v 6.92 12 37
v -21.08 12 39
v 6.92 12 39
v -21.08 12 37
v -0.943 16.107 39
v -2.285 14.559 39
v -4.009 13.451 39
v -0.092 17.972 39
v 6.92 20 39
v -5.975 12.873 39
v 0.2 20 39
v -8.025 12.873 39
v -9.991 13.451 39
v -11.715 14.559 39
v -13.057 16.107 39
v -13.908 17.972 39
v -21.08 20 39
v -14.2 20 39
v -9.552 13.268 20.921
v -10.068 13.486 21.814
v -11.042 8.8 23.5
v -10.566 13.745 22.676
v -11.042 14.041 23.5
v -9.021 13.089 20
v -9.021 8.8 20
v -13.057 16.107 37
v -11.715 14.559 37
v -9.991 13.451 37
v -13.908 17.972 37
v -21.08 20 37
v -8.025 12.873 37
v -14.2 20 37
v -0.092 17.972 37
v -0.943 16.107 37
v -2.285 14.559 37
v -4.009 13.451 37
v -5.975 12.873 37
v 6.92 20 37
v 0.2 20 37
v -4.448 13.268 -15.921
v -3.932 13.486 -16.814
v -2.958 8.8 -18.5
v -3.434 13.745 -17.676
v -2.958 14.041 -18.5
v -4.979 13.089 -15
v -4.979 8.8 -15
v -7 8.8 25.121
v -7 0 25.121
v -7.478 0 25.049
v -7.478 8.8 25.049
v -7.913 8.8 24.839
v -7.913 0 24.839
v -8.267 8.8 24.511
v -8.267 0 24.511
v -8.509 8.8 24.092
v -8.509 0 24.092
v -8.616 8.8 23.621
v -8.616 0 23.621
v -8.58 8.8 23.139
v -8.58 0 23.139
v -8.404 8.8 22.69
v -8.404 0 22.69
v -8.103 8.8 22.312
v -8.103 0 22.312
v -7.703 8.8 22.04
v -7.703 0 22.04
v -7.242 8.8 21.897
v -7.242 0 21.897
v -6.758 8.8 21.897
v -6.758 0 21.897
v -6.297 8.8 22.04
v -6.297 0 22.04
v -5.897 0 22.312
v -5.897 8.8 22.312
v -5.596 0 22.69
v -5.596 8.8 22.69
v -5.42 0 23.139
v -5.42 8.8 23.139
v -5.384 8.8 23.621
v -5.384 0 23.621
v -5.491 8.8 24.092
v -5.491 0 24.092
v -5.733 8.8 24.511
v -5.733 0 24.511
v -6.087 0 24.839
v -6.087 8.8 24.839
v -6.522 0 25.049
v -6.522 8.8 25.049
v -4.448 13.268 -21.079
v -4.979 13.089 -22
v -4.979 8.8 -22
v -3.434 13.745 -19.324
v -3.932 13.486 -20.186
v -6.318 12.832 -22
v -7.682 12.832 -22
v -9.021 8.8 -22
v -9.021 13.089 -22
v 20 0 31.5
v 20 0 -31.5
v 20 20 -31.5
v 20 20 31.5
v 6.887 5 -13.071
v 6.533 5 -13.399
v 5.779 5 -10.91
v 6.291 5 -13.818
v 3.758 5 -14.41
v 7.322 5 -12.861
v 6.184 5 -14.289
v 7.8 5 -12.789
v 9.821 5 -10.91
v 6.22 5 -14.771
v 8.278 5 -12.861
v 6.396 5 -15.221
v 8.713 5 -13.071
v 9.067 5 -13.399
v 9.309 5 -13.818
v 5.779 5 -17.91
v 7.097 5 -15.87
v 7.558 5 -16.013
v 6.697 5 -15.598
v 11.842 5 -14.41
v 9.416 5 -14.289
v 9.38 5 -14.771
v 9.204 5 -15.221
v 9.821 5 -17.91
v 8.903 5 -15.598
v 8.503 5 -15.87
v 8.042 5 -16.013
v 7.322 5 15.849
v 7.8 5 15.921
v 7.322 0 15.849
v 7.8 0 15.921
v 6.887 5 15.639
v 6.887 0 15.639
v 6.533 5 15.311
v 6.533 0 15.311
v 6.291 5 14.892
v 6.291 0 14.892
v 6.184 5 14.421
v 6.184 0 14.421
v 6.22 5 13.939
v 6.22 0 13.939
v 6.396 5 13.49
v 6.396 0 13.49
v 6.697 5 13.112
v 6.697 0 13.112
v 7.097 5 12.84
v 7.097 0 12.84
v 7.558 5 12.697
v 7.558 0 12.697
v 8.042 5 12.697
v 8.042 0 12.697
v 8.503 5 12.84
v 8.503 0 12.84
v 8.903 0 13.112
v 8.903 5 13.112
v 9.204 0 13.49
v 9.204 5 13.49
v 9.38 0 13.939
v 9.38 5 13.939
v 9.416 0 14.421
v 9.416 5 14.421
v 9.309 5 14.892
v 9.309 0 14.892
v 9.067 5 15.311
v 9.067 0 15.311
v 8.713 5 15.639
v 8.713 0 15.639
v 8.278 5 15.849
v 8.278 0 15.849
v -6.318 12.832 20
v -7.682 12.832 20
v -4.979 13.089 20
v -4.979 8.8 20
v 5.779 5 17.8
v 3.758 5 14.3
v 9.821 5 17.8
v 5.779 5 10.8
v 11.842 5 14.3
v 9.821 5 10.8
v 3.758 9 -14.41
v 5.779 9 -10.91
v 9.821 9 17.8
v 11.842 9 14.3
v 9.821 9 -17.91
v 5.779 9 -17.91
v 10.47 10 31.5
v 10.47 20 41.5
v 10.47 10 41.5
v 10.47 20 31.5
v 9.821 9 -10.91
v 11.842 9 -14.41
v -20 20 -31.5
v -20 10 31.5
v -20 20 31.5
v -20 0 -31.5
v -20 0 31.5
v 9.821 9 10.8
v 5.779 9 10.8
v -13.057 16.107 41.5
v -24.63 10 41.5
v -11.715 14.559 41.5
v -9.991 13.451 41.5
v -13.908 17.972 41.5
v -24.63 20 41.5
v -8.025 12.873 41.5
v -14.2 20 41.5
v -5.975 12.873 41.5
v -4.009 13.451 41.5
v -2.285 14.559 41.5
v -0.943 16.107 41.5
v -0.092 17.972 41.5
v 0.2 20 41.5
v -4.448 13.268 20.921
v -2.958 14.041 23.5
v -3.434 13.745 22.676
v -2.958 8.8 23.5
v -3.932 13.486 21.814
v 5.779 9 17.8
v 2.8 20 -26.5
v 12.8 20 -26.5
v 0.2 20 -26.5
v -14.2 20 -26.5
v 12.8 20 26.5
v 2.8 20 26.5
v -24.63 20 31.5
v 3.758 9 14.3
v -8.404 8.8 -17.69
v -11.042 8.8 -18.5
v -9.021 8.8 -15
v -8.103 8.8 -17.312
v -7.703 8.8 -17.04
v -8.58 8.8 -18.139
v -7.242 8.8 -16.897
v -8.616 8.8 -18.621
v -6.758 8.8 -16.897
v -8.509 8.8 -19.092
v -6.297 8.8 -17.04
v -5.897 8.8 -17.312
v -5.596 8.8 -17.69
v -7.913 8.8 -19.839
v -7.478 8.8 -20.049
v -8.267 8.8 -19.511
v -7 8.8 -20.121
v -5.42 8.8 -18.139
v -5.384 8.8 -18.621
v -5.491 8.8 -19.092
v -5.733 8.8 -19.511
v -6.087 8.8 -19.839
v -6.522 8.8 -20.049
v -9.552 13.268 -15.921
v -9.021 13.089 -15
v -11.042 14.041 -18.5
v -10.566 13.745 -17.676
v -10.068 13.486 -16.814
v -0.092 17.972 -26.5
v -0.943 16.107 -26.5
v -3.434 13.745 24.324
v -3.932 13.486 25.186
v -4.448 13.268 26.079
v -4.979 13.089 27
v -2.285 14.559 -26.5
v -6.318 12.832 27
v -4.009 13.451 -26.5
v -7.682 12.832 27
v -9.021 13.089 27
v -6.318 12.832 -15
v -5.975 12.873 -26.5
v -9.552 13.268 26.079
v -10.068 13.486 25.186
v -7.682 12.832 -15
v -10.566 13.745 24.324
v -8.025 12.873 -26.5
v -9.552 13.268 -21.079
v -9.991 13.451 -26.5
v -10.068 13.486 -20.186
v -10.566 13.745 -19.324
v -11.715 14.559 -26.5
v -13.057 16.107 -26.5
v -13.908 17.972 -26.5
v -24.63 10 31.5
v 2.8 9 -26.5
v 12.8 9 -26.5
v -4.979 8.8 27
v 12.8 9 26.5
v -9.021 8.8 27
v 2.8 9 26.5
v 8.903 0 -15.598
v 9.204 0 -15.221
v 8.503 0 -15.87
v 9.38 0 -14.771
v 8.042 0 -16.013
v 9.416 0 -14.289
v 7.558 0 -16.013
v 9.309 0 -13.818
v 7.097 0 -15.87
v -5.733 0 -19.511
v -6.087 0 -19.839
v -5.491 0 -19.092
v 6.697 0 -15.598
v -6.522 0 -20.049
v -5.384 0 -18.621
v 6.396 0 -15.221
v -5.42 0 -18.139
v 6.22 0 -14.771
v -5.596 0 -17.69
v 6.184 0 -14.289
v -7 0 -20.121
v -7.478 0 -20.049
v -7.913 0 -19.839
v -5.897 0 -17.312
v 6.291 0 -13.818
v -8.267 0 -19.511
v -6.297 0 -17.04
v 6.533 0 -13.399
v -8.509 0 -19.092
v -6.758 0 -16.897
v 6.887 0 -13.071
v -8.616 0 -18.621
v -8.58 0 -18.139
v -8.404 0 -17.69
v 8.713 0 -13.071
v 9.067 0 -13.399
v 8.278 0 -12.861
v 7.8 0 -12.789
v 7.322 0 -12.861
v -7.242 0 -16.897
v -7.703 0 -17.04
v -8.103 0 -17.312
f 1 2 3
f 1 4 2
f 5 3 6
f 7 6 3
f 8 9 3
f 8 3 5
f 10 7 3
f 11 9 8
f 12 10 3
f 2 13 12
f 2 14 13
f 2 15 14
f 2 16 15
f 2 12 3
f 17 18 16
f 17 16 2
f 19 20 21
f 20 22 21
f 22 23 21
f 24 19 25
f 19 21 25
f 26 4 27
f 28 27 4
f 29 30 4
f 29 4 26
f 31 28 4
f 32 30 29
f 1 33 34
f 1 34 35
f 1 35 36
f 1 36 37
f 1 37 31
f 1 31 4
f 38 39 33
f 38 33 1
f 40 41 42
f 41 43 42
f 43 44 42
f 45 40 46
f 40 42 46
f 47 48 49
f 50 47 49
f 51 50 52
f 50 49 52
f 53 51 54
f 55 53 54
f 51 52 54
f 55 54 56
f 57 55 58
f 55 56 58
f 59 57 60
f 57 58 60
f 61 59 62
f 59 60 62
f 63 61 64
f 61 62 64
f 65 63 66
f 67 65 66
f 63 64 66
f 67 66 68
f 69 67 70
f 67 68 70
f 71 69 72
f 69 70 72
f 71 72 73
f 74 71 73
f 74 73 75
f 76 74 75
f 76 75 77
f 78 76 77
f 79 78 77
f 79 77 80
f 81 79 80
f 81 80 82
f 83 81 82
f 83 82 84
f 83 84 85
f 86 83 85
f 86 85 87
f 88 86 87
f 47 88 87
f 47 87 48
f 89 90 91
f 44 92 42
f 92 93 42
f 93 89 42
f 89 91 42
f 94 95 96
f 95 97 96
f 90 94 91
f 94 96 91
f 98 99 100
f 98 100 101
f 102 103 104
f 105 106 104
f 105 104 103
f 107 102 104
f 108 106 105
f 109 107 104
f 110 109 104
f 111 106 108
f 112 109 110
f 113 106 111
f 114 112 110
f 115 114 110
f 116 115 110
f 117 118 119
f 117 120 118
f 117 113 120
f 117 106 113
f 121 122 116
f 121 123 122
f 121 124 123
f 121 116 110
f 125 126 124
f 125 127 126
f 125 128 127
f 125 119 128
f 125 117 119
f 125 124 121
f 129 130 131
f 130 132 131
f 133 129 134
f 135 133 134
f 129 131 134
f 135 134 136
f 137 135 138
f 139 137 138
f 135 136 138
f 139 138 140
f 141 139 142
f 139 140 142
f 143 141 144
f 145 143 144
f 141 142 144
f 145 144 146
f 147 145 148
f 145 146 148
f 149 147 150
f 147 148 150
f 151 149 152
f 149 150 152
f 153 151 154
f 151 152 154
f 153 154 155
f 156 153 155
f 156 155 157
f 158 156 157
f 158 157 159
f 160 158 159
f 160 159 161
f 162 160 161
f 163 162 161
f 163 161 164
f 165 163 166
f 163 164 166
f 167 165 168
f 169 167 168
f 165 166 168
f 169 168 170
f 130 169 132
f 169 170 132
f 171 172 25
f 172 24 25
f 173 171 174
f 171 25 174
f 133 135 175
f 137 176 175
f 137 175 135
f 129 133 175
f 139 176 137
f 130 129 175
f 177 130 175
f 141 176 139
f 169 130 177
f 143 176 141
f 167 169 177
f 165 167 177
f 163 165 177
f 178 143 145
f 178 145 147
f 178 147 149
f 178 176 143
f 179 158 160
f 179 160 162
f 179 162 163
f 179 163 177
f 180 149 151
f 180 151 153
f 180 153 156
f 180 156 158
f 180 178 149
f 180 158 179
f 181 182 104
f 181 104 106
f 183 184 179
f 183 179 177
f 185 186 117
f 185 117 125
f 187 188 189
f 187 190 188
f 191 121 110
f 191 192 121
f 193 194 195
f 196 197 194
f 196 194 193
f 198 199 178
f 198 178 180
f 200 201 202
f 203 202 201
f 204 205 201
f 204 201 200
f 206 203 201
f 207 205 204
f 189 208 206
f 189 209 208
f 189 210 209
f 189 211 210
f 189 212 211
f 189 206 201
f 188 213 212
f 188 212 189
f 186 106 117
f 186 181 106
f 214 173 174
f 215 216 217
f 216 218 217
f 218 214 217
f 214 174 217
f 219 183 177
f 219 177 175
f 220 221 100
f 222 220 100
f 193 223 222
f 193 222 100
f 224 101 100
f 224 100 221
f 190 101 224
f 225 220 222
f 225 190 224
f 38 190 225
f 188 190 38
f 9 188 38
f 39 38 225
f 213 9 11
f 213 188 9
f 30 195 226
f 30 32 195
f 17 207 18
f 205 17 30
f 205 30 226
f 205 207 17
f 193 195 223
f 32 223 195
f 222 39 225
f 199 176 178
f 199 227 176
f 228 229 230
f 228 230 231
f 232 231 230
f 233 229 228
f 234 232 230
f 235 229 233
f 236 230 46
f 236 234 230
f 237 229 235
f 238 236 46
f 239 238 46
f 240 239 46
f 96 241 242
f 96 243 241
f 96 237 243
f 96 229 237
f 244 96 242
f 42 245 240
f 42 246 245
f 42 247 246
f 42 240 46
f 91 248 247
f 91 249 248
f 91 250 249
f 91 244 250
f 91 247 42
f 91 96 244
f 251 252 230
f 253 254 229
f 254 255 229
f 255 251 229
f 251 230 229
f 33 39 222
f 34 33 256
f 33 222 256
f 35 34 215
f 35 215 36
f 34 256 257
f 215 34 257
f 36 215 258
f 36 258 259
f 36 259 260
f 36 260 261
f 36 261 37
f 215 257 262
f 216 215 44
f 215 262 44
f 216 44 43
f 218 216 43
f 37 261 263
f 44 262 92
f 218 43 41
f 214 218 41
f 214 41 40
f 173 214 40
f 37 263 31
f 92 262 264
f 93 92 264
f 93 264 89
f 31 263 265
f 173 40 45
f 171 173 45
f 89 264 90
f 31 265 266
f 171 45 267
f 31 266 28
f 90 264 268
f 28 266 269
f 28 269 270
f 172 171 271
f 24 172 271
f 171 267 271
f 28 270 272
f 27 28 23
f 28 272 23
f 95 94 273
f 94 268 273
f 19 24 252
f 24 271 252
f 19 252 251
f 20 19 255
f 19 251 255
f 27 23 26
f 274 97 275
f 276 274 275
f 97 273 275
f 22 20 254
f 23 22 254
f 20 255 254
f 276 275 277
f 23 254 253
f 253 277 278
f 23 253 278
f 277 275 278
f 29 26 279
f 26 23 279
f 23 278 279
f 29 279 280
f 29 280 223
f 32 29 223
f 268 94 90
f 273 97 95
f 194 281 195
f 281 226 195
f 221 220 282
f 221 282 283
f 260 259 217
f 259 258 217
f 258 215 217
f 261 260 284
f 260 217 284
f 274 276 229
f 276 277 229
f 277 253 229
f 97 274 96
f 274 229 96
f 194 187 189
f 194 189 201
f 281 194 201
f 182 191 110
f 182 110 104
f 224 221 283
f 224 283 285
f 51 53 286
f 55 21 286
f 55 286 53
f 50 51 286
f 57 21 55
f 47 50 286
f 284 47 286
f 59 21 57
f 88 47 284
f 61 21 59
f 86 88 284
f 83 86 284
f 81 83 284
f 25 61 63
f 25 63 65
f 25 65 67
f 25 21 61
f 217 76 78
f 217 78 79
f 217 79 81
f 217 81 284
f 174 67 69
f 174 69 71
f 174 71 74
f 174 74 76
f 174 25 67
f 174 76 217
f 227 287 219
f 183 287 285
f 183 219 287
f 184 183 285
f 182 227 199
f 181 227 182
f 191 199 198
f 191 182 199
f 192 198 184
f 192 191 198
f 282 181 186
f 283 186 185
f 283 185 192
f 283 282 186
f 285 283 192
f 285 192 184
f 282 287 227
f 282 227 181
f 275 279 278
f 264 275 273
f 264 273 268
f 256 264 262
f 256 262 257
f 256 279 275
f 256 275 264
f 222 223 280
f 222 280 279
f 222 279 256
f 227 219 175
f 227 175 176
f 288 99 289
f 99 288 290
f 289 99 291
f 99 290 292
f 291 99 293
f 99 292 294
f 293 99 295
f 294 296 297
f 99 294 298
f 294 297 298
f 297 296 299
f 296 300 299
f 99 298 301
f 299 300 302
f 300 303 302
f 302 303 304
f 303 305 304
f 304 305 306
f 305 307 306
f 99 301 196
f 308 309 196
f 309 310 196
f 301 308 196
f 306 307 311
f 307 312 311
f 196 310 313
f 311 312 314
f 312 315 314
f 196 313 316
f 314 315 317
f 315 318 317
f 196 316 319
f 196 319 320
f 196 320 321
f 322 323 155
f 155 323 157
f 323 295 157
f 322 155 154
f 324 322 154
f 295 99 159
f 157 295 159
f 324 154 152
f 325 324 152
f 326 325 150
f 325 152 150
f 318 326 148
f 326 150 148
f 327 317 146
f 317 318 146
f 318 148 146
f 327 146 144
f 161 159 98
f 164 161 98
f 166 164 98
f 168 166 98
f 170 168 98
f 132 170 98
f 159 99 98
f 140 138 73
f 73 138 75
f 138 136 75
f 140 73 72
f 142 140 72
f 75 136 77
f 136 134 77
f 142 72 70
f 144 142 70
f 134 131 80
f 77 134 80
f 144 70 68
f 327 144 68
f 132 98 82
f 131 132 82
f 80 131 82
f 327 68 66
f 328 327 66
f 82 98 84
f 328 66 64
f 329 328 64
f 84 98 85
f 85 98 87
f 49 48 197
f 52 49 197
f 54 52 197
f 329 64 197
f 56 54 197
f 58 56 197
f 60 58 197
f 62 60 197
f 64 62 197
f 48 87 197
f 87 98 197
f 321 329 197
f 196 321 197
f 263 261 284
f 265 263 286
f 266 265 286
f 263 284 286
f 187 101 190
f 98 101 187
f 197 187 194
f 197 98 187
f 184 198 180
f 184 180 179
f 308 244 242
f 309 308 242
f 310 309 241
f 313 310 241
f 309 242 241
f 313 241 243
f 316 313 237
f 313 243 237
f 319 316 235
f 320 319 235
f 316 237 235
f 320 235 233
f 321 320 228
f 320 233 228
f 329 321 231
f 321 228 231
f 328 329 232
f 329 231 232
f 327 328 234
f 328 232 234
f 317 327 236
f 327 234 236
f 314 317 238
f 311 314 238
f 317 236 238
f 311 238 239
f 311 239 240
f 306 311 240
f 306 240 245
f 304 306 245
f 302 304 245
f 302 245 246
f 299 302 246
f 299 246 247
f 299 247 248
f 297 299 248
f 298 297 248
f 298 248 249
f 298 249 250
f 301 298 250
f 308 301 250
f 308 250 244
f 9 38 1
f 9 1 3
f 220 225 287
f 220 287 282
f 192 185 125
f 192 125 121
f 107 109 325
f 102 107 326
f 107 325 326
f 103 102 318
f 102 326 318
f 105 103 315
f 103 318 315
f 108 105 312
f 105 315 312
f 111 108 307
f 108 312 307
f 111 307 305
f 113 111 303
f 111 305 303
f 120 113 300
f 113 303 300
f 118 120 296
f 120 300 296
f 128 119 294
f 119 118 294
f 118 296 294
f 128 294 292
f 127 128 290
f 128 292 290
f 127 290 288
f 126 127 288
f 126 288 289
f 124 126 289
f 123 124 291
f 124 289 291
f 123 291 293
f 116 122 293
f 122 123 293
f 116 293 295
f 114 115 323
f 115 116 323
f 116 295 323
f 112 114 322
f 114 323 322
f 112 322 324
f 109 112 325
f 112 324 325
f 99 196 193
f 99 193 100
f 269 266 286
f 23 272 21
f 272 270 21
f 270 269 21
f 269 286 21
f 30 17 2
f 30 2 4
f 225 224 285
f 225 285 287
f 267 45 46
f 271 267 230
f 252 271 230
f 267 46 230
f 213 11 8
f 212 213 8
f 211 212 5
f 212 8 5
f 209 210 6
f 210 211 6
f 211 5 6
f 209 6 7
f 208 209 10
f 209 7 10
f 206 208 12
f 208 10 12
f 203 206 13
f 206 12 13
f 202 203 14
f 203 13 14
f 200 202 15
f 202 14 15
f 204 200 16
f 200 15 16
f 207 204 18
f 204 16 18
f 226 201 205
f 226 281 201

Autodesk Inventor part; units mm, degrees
ref_plane "YZ Plane" through (0, 0, 0) normal (1, 0, 0) x (0, 1, 0)
ref_plane "XZ Plane" through (0, 0, 0) normal (0, 1, 0) x (-1, 0, 0)
ref_plane "XY Plane" through (0, 0, 0) normal (0, 0, 1) x (1, 0, 0)
sketch "Sketch1" plane through (0, 0, 0) normal (0, 1, 0) x (-1, 0, 0)
  line L0 (28, 0) -> (-28, 0) projected
  line L1 (0, -44.1) -> (0, 44.1) projected
  line L2 (-20, 31.5) -> (20, 31.5)
  line L3 (20, 31.5) -> (20, -31.5)
  line L4 (20, -31.5) -> (-20, -31.5)
  line L5 (-20, -31.5) -> (-20, 31.5)
  line L6 (-20, 31.5) -> (20, -31.5) construction
  line L7 (20, 31.5) -> (-20, -31.5) construction
  point P0 (0, 0)
  dimension "d0" = 40
  dimension "d1" = 63
extrude "Extrusion1" add sketch "Sketch1" along normal blind 20
sketch "Sketch2" plane through (0, 20, 0) normal (0, 1, 0) x (1, 0, 0)
  line L0 (20, 31.5) -> (-20, 31.5) projected
  line L1 (-20, 31.5) -> (-20, -31.5) projected
  line L2 (2.8, 26.5) -> (12.8, 26.5)
  line L3 (12.8, 26.5) -> (12.8, -26.5)
  line L4 (12.8, -26.5) -> (2.8, -26.5)
  line L5 (2.8, -26.5) -> (2.8, 26.5)
  line L6 (20, -31.5) -> (20, 31.5) projected
  dimension "d9" = 10
  dimension "d10" = 53
  dimension "d11" = 5
  dimension "d23" = 7.2
extrude "Extrusion2" cut sketch "Sketch2" against normal blind 11
sketch "Sketch3" plane through (0, 9, 0) normal (0, 1, 0) x (1, 0, 0)
  line L0 (20, -31.5) -> (20, 31.5) projected
  line L1 (12.8, 26.5) -> (12.8, -26.5) projected
  line L2 (20, 31.5) -> (-20, 31.5) projected
  point P0 (0, 0)
  point P1 (7.8, 14.41)
  point P2 (7.8, -14.3)
  dimension "d22" = 5
  dimension "d27" = 17.09
  dimension "d40" = 28.71
  dimension "d41" = 12.2
hole "Hole1" at (7.8, 9, -14.41) at (7.8, 9, 14.3) direction (0, -1, 0) diameter 3.242 end through all thread size "M4x0.7" class "6H" standard "ISO Metric profile"
sketch "Sketch5" plane through (0, 9, 0) normal (0, 1, 0) x (1, 0, 0)
  circle A0 centre (7.8, 14.41) radius 1.621 projected
  line L0 (9.8207, 10.91) -> (5.7793, 10.91)
  line L1 (5.7793, 10.91) -> (3.7585, 14.41)
  line L2 (3.7585, 14.41) -> (5.7793, 17.91)
  line L3 (5.7793, 17.91) -> (9.8207, 17.91)
  line L4 (9.8207, 17.91) -> (11.8415, 14.41)
  line L5 (11.8415, 14.41) -> (9.8207, 10.91)
  line L6 (2.8, 26.5) -> (12.8, 26.5) projected
  line L7 (12.8, -26.5) -> (2.8, -26.5) projected
  circle A1 centre (7.8, -14.3) radius 1.621 projected
  line L8 (9.8207, -17.8) -> (5.7793, -17.8)
  line L9 (5.7793, -17.8) -> (3.7585, -14.3)
  line L10 (3.7585, -14.3) -> (5.7793, -10.8)
  line L11 (5.7793, -10.8) -> (9.8207, -10.8)
  line L12 (9.8207, -10.8) -> (11.8415, -14.3)
  line L13 (11.8415, -14.3) -> (9.8207, -17.8)
  point P0 (0, 0)
  dimension "d37" = 7
  dimension "d42" = 7
extrude "Extrusion3" cut sketch "Sketch5" against normal blind 4 contours L0 L1 L2 L3 L4 L5 | A1 | L8 L9 L10 L11 L12 L13
sketch "Sketch9" plane through (-20, 0, 31.5) normal (0, 0, 1) x (1, 0, 0)
  line L0 (30.47, 20) -> (30.47, 10)
  line L1 (30.47, 10) -> (-4.63, 10)
  line L2 (-4.63, 10) -> (-4.63, 20)
  line L3 (0, 0) -> (0, 20) projected
  line L4 (40, 20) -> (0, 20) projected
  arc A0 (5.8, 20) -> (20.2, 20) centre (13, 20) ccw
  line L5 (-4.63, 20) -> (5.8, 20)
  line L6 (20.2, 20) -> (30.47, 20)
  line L7 (40, 0) -> (40, 20) projected
  line L8 (5.8, 20) -> (20.2, 20)
  point P0 (20, 0)
  point P1 (0, 10)
  dimension "d58" = 35.1
  dimension "d59" = 10
  dimension "d60" = 4.63
  dimension "d64" = 7.2
  dimension "d65" = 17.63
  dimension "d66" = 19.8
  dimension "d67" = 14.4
extrude "Extrusion6" add sketch "Sketch9" along normal blind 10 contours L0 L1 L3 L4 A0 | L1 L2 L5 L3
extrude "Extrusion7" cut sketch "Sketch9" against normal blind 58 contours A0 L4
sketch "Sketch10" plane through (0, 20, 0) normal (0, 1, 0) x (1, 0, 0)
  line L0 (-21.08, -37) -> (6.92, -37)
  line L1 (6.92, -37) -> (6.92, -39)
  line L2 (6.92, -39) -> (-21.08, -39)
  line L3 (-21.08, -39) -> (-21.08, -37)
  line L4 (0.2, -41.5) -> (-14.2, -41.5) projected
  line L5 (-24.63, -31.5) -> (-24.63, -41.5) projected
  point P0 (0, 0)
  dimension "d72" = 2
  dimension "d73" = 2.5
  dimension "d74" = 28
  dimension "d75" = 3.55
extrude "Extrusion8" cut sketch "Sketch10" against normal blind 8
sketch "Sketch13" plane through (0, 0, 0) normal (0, -1, 0) x (1, 0, 0)
  line L0 (-20, -31.5) -> (-20, 31.5) projected
  line L1 (20, -31.5) -> (-20, -31.5) projected
  point P0 (0, 0)
  point P1 (-7, -18.5)
  dimension "d89" = 13
  dimension "d90" = 13
ref_plane "Work Plane3" through (0, 8.8, 0) normal (0, 1, 0) x (1, 0, 0)
sketch "Sketch31" plane through (0, 8.8, 0) normal (0, 1, 0) x (1, 0, 0)
  line L0 (-4.9793, 15) -> (-9.0207, 15)
  line L1 (-9.0207, 15) -> (-11.0415, 18.5)
  line L2 (-11.0415, 18.5) -> (-9.0207, 22)
  line L3 (-9.0207, 22) -> (-4.9793, 22)
  line L4 (-4.9793, 22) -> (-2.9585, 18.5)
  line L5 (-2.9585, 18.5) -> (-4.9793, 15)
  line L6 (20, 31.5) -> (-20, 31.5) projected
  line L7 (-20, 31.5) -> (-20, -31.5) projected
  line L8 (-4.9793, -27) -> (-9.0207, -27)
  line L9 (-9.0207, -27) -> (-11.0415, -23.5)
  line L10 (-11.0415, -23.5) -> (-9.0207, -20)
  line L11 (-9.0207, -20) -> (-4.9793, -20)
  line L12 (-4.9793, -20) -> (-2.9585, -23.5)
  line L13 (-2.9585, -23.5) -> (-4.9793, -27)
  point P0 (0, 0)
  point P1 (-7, 18.5)
  point P2 (-7, -23.5)
  dimension "d159" = 13
  dimension "d160" = 13
  dimension "d161" = 7
  dimension "d171" = 7
  dimension "d172" = 13
  dimension "d173" = 42
extrude "Extrusion19" cut sketch "Sketch31" along normal through all
hole "Hole7" at (-7, 0, -18.5) direction (0, 1, 0) diameter 3.242 end through all thread size "M4x0.7" class "6H" standard "ISO Metric profile"
sketch "Sketch33" plane through (0, 8.8, 0) normal (0, 1, 0) x (1, 0, 0)
  line L0 (-20, 31.5) -> (-20, -31.5) projected
  line L1 (-9.0207, -20) -> (-4.9793, -20) projected
  point P0 (0, 0)
  point P1 (-7, -23.5001)
  dimension "d181" = 13
  dimension "d182" = 3.5001
hole "Hole8" at (-7, 8.8, 23.5001) direction (0, -1, 0) diameter 3.242 end through all thread size "M4x0.7" class "6H" standard "ISO Metric profile"
properties part number "uchwyt_strzykawka_srodek_proba_zapisania" material "PC/ABS Plastic"
